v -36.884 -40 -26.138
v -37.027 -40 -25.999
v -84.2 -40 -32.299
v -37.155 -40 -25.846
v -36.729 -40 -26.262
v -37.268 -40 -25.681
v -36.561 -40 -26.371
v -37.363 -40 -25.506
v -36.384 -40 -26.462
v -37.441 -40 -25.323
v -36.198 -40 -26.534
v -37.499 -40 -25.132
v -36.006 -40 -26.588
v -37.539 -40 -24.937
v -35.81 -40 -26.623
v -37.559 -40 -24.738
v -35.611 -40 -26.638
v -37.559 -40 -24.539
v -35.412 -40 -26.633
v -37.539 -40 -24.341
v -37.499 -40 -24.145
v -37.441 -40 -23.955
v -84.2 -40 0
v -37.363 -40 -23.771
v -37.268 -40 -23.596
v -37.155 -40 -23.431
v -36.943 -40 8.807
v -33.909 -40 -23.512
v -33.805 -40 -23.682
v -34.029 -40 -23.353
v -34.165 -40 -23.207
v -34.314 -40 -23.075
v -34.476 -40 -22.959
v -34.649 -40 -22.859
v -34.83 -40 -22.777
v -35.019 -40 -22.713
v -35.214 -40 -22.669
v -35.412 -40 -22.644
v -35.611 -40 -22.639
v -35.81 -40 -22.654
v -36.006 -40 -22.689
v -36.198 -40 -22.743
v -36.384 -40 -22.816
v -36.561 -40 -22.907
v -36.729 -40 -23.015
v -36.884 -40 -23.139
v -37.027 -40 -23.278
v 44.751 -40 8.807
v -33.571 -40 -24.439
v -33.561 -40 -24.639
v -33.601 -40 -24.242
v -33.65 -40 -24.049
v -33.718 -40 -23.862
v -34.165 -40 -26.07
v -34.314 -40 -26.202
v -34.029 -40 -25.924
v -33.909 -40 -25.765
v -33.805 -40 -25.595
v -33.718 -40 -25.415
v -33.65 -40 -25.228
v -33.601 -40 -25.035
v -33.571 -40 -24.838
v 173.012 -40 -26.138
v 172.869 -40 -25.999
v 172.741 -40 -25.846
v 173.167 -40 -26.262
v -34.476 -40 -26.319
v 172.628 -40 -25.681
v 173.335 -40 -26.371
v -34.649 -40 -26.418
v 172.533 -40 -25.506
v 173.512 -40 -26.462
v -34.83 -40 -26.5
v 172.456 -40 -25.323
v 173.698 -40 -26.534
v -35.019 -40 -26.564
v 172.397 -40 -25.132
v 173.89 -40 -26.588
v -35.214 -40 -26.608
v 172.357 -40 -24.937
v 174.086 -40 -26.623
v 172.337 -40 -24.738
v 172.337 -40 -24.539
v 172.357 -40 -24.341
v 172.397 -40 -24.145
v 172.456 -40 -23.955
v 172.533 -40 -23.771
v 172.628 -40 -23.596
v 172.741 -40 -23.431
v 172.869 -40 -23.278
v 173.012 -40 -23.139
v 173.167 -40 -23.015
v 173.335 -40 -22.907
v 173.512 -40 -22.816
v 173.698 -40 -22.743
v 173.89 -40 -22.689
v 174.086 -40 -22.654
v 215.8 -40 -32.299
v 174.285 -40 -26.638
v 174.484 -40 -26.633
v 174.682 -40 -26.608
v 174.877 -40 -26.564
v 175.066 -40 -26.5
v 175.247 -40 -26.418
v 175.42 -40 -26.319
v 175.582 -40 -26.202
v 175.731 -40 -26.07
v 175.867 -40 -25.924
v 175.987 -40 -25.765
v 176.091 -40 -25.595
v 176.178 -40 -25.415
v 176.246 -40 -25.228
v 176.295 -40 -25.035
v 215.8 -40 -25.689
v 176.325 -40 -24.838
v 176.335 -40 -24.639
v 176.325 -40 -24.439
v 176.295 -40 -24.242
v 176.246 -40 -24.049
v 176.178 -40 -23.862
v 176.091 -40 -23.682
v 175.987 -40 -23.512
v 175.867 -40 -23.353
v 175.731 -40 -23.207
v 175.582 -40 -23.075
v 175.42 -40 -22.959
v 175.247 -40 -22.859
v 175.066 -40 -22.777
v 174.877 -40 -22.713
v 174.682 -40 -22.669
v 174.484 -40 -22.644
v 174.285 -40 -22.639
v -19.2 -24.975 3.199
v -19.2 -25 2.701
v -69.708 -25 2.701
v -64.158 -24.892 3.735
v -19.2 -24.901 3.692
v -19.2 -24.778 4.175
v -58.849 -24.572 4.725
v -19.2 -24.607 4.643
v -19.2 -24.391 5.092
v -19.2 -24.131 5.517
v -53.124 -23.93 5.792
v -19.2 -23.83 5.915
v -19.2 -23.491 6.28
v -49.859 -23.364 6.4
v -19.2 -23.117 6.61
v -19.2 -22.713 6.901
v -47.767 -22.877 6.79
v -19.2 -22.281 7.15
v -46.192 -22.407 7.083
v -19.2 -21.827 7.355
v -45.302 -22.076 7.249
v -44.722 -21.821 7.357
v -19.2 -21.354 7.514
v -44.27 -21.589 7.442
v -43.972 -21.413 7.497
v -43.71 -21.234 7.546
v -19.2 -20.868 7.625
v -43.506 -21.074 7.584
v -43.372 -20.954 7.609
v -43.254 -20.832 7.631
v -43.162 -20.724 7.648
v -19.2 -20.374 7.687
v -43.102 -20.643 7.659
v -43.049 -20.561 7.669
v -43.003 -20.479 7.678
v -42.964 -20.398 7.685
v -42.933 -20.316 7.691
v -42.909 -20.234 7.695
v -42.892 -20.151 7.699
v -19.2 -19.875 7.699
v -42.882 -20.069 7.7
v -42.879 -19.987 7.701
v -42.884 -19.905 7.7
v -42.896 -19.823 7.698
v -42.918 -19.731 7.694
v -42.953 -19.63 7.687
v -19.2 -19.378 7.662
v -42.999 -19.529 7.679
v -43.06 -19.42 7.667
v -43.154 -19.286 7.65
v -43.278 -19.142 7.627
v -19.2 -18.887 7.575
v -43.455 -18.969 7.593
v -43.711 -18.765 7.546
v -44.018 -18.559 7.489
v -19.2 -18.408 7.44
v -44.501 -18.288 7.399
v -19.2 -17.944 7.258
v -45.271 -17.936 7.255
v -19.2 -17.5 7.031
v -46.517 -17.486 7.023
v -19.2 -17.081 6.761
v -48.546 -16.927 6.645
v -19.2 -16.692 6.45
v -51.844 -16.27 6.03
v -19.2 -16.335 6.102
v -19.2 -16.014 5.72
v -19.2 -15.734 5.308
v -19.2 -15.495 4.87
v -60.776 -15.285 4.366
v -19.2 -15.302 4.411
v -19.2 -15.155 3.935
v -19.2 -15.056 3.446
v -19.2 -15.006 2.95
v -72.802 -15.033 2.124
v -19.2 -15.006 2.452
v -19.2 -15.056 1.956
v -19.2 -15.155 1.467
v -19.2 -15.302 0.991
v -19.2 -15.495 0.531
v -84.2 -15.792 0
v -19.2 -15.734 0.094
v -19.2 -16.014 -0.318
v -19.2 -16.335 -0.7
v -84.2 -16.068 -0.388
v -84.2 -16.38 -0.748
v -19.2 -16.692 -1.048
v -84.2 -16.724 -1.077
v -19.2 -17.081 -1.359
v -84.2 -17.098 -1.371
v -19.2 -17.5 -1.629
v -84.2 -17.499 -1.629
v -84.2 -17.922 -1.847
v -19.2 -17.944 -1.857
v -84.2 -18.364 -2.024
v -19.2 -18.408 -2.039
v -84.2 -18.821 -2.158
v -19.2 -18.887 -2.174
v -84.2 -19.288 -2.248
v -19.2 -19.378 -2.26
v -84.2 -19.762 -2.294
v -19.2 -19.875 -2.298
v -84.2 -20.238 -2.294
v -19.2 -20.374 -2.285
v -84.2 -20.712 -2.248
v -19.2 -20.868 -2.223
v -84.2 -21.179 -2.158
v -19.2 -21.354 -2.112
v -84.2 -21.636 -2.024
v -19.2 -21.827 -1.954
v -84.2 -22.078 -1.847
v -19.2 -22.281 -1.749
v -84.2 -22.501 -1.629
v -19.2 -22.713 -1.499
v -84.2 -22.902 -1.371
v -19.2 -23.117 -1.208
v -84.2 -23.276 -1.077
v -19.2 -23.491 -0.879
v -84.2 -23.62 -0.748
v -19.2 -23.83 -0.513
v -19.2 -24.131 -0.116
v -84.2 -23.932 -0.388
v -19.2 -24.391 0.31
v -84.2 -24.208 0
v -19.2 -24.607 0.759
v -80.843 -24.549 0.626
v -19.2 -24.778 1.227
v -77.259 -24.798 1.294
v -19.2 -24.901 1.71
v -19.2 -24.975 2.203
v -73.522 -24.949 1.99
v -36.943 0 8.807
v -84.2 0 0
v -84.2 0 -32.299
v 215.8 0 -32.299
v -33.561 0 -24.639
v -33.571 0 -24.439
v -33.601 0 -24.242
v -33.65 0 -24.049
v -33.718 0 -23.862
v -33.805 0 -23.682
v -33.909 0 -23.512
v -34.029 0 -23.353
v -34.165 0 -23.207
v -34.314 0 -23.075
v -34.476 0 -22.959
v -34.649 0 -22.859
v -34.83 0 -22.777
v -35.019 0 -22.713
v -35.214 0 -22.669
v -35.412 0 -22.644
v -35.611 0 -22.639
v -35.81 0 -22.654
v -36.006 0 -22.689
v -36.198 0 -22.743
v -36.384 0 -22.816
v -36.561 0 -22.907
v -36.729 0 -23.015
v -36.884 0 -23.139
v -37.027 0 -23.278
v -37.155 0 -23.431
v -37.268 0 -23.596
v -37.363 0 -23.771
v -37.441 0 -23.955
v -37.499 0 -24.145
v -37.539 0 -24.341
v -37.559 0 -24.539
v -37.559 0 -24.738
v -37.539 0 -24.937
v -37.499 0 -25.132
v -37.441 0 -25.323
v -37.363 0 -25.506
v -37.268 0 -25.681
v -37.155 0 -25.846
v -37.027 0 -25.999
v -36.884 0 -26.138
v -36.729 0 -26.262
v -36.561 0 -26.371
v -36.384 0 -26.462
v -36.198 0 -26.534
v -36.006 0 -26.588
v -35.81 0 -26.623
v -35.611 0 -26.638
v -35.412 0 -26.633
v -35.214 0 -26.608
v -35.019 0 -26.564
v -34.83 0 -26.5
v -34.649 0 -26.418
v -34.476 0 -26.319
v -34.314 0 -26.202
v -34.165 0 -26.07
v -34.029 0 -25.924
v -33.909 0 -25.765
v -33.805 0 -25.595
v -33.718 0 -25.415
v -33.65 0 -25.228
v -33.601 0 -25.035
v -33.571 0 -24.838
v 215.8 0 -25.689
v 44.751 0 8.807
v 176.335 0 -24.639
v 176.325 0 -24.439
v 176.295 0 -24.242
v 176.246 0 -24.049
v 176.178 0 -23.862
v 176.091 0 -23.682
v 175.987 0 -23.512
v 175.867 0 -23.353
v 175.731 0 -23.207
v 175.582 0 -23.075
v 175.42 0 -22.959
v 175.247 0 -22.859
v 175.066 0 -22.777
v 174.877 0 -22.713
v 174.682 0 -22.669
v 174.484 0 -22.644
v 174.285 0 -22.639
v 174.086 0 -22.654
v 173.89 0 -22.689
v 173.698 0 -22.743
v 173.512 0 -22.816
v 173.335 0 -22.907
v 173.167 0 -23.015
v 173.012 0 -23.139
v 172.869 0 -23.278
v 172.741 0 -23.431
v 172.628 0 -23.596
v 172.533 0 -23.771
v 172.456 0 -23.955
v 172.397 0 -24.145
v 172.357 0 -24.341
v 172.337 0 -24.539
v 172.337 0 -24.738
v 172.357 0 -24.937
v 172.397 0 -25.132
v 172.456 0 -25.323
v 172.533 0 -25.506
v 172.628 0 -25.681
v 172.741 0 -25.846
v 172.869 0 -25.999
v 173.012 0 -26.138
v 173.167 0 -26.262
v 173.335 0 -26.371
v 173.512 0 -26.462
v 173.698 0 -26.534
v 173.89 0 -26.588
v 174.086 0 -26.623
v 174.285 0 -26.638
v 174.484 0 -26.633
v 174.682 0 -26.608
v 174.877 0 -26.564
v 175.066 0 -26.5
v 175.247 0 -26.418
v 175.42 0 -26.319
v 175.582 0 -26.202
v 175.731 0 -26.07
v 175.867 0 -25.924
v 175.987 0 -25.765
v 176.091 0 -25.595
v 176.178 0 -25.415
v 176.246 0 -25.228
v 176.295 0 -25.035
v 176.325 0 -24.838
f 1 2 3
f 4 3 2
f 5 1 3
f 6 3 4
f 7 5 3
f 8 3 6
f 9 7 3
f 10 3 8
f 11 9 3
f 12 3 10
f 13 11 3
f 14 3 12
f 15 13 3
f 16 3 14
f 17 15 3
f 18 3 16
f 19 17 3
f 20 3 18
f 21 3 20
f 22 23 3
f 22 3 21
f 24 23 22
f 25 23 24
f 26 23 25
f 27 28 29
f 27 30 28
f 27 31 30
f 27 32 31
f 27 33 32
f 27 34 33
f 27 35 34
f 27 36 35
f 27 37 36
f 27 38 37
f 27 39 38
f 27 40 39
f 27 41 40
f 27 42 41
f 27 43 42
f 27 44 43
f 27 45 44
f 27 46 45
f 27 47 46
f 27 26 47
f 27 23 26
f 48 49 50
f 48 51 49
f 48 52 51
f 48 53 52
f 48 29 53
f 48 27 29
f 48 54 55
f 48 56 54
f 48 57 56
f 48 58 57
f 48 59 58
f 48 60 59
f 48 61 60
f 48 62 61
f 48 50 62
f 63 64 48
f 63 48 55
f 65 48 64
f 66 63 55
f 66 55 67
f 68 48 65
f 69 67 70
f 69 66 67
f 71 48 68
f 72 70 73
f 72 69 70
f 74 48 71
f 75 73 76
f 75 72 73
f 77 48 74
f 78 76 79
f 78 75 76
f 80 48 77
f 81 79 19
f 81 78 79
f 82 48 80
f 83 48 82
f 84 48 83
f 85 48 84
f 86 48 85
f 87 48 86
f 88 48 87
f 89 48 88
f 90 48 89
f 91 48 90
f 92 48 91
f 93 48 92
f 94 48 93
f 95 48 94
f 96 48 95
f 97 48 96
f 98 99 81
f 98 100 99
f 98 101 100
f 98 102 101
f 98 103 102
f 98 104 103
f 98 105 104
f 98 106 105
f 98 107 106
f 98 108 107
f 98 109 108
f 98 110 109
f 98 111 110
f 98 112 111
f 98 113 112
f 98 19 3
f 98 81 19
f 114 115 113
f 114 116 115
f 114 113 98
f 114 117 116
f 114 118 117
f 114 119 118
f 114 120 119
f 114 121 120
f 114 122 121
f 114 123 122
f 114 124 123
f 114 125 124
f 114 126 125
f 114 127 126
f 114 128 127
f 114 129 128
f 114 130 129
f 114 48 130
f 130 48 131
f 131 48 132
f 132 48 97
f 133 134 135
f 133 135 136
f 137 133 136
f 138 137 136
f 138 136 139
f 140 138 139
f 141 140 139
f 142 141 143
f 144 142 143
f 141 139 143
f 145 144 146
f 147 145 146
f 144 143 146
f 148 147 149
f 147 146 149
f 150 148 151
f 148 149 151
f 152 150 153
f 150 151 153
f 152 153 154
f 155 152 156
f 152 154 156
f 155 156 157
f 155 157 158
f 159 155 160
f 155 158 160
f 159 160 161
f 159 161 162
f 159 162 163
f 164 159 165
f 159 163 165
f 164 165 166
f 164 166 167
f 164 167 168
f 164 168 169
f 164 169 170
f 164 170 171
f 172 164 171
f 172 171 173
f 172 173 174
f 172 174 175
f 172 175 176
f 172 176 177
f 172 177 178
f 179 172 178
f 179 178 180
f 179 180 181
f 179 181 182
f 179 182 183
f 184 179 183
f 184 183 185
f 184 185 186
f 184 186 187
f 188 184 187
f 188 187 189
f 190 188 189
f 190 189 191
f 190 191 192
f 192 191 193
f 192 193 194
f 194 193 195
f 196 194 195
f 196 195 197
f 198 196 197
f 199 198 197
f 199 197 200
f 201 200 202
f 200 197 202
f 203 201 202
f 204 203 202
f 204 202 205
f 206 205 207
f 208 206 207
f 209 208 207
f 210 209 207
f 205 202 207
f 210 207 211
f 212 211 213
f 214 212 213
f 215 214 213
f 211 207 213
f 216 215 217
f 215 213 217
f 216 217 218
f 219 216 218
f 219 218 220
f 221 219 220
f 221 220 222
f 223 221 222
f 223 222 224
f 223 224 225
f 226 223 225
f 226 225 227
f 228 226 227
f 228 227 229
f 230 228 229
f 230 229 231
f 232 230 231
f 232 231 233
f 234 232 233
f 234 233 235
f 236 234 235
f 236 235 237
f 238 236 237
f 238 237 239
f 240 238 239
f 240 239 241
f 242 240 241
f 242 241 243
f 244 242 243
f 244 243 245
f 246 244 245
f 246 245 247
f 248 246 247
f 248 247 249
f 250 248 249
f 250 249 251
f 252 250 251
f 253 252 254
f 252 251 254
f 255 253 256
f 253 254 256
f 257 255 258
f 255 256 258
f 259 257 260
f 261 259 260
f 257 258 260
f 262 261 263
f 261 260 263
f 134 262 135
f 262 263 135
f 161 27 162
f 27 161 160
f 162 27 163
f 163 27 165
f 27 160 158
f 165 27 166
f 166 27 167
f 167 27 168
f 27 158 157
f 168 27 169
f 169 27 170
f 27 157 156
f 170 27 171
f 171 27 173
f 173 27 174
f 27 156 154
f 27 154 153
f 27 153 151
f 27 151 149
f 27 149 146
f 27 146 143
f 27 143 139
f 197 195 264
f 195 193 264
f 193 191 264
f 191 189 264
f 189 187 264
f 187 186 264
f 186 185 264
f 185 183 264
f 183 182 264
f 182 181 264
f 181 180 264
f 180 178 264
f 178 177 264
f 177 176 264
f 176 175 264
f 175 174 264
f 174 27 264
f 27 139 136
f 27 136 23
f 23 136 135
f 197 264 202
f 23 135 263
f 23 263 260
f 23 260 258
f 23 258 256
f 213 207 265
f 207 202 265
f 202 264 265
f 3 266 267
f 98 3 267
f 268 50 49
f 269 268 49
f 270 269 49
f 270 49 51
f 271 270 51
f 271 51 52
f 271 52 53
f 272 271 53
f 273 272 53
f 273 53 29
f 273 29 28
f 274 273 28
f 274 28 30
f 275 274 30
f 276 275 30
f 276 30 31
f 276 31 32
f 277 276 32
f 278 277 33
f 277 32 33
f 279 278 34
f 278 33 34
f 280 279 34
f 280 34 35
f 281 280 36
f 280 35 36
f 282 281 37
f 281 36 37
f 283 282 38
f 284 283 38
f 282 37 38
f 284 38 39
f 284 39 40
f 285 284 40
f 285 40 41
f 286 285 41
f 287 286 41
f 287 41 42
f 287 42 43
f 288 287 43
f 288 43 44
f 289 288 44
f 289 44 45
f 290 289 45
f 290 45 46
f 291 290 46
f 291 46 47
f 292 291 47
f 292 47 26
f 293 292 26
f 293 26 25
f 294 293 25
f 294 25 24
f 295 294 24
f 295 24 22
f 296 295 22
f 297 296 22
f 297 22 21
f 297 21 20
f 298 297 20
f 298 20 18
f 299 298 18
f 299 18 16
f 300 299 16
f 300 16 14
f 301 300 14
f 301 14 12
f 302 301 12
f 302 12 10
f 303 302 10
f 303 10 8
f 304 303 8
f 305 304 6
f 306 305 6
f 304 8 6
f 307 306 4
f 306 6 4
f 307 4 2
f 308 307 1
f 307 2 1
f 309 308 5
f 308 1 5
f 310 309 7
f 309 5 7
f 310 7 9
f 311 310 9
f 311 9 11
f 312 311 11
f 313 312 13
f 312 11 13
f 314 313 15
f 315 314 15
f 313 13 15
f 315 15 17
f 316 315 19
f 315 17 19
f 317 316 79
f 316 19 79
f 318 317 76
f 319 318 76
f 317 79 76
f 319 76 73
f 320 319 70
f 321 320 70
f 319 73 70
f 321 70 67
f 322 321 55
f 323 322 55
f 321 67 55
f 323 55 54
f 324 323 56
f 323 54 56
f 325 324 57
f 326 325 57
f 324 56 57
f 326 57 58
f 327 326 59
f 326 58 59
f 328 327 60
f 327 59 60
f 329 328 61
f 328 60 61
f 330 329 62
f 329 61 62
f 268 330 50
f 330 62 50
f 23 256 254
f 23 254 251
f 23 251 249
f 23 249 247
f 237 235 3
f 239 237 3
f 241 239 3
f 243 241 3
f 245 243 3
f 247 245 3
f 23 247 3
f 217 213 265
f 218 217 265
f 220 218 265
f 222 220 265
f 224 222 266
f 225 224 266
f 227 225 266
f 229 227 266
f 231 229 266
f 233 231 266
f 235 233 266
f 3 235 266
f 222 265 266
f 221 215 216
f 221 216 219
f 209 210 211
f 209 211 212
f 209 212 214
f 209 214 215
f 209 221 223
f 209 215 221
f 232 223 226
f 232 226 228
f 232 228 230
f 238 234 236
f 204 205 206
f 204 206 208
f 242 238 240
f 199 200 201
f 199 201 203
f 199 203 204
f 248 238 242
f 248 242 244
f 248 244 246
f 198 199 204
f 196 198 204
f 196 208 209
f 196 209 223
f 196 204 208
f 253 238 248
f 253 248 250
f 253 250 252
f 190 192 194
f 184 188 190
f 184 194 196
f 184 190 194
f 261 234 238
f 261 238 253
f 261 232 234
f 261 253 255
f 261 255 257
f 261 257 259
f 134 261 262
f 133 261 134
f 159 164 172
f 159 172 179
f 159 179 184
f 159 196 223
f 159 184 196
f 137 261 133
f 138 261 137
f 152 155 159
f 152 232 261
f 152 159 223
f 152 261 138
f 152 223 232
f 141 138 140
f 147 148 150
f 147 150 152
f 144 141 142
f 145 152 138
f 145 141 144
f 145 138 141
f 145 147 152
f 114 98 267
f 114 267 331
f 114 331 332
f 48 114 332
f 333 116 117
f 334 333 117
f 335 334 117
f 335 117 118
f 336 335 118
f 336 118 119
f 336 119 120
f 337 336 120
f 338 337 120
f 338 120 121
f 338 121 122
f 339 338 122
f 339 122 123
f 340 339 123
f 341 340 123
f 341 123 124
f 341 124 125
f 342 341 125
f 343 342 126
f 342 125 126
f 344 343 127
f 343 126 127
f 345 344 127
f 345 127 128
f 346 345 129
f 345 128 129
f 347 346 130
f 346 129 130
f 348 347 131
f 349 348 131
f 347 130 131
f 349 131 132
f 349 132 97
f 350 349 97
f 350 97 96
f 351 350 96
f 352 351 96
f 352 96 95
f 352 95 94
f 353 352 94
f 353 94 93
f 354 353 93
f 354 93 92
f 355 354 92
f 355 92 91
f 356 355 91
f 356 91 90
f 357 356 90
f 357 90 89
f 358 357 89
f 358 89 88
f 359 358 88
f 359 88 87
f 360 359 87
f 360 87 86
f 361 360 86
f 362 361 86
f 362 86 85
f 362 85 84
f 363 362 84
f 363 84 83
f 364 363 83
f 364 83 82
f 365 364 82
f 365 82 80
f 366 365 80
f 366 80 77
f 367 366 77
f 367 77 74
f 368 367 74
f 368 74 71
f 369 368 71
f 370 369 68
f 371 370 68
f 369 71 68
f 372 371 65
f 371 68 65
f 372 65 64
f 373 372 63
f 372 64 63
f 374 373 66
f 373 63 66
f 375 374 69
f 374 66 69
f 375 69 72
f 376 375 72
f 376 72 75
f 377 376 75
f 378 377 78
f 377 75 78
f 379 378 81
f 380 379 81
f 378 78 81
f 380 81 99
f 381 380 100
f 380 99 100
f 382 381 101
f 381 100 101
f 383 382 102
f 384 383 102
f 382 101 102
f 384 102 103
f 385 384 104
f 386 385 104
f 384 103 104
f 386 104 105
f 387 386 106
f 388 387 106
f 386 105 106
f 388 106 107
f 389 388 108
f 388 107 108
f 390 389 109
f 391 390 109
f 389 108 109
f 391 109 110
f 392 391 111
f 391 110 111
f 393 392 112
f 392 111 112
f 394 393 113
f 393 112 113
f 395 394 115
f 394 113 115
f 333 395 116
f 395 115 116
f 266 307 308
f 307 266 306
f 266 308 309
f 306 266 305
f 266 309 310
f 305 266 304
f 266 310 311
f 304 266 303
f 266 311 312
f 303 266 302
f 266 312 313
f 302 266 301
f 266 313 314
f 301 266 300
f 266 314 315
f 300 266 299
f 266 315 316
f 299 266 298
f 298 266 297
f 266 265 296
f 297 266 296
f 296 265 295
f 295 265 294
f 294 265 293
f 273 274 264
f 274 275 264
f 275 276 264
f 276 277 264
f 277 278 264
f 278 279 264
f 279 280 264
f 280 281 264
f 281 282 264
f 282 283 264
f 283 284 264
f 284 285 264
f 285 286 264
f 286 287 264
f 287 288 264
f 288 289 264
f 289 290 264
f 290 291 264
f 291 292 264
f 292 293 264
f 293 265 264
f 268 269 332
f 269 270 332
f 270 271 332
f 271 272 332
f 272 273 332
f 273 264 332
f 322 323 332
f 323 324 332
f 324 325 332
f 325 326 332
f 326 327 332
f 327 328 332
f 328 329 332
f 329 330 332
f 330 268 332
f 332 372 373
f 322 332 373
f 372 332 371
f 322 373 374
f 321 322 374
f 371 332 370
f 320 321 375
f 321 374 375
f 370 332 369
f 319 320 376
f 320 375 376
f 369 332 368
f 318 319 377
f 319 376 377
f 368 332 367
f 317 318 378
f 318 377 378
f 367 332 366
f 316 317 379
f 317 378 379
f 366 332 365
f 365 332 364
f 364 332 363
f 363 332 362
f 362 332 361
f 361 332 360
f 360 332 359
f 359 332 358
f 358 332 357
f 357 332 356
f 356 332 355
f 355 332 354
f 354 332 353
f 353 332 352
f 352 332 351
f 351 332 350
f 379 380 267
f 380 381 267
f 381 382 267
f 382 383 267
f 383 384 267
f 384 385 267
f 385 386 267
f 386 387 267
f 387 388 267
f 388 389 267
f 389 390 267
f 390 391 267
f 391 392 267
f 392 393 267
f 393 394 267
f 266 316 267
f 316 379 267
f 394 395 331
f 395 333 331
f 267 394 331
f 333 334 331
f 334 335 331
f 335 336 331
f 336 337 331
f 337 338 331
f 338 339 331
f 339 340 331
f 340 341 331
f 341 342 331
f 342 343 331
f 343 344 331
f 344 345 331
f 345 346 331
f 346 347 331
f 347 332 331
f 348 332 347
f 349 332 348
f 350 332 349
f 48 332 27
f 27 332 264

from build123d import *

# Parameters (mm, degrees)
F1_DEPTH = 40
F2_R     = 5
F3_DEPTH = 65
F4_R     = 2
F5_DEPTH = 40.001


with BuildPart() as f1:
    # F0 (on Front) → F1 (new body)
    with BuildSketch(Plane.XZ):
        Polygon((-84.199729, 0), (-84.199729, -32.299187), (215.800271, -32.299187), (215.800271, -25.689224), (44.751238, 8.807085), (-36.943395, 8.807085), align=None)
    extrude(amount=F1_DEPTH)

    # F2 (on face) → F3 (cut)
    with BuildSketch(Plane(origin=(-84.199729, 0, 0), x_dir=(0, -1, 0), z_dir=(-1, 0, 0))):
        with Locations((20, 2.700813)):
            Circle(F2_R)
    extrude(amount=-F3_DEPTH, mode=Mode.SUBTRACT)

    # F4 (on face) → F5 (cut, through all)
    with BuildSketch(Plane.XZ.offset(40)):
        with Locations((-35.561115, -24.638616)):
            Circle(F4_R)
        with Locations((174.334928, -24.638616)):
            Circle(F4_R)
    extrude(amount=-F5_DEPTH, mode=Mode.SUBTRACT)


solid = f1.part
